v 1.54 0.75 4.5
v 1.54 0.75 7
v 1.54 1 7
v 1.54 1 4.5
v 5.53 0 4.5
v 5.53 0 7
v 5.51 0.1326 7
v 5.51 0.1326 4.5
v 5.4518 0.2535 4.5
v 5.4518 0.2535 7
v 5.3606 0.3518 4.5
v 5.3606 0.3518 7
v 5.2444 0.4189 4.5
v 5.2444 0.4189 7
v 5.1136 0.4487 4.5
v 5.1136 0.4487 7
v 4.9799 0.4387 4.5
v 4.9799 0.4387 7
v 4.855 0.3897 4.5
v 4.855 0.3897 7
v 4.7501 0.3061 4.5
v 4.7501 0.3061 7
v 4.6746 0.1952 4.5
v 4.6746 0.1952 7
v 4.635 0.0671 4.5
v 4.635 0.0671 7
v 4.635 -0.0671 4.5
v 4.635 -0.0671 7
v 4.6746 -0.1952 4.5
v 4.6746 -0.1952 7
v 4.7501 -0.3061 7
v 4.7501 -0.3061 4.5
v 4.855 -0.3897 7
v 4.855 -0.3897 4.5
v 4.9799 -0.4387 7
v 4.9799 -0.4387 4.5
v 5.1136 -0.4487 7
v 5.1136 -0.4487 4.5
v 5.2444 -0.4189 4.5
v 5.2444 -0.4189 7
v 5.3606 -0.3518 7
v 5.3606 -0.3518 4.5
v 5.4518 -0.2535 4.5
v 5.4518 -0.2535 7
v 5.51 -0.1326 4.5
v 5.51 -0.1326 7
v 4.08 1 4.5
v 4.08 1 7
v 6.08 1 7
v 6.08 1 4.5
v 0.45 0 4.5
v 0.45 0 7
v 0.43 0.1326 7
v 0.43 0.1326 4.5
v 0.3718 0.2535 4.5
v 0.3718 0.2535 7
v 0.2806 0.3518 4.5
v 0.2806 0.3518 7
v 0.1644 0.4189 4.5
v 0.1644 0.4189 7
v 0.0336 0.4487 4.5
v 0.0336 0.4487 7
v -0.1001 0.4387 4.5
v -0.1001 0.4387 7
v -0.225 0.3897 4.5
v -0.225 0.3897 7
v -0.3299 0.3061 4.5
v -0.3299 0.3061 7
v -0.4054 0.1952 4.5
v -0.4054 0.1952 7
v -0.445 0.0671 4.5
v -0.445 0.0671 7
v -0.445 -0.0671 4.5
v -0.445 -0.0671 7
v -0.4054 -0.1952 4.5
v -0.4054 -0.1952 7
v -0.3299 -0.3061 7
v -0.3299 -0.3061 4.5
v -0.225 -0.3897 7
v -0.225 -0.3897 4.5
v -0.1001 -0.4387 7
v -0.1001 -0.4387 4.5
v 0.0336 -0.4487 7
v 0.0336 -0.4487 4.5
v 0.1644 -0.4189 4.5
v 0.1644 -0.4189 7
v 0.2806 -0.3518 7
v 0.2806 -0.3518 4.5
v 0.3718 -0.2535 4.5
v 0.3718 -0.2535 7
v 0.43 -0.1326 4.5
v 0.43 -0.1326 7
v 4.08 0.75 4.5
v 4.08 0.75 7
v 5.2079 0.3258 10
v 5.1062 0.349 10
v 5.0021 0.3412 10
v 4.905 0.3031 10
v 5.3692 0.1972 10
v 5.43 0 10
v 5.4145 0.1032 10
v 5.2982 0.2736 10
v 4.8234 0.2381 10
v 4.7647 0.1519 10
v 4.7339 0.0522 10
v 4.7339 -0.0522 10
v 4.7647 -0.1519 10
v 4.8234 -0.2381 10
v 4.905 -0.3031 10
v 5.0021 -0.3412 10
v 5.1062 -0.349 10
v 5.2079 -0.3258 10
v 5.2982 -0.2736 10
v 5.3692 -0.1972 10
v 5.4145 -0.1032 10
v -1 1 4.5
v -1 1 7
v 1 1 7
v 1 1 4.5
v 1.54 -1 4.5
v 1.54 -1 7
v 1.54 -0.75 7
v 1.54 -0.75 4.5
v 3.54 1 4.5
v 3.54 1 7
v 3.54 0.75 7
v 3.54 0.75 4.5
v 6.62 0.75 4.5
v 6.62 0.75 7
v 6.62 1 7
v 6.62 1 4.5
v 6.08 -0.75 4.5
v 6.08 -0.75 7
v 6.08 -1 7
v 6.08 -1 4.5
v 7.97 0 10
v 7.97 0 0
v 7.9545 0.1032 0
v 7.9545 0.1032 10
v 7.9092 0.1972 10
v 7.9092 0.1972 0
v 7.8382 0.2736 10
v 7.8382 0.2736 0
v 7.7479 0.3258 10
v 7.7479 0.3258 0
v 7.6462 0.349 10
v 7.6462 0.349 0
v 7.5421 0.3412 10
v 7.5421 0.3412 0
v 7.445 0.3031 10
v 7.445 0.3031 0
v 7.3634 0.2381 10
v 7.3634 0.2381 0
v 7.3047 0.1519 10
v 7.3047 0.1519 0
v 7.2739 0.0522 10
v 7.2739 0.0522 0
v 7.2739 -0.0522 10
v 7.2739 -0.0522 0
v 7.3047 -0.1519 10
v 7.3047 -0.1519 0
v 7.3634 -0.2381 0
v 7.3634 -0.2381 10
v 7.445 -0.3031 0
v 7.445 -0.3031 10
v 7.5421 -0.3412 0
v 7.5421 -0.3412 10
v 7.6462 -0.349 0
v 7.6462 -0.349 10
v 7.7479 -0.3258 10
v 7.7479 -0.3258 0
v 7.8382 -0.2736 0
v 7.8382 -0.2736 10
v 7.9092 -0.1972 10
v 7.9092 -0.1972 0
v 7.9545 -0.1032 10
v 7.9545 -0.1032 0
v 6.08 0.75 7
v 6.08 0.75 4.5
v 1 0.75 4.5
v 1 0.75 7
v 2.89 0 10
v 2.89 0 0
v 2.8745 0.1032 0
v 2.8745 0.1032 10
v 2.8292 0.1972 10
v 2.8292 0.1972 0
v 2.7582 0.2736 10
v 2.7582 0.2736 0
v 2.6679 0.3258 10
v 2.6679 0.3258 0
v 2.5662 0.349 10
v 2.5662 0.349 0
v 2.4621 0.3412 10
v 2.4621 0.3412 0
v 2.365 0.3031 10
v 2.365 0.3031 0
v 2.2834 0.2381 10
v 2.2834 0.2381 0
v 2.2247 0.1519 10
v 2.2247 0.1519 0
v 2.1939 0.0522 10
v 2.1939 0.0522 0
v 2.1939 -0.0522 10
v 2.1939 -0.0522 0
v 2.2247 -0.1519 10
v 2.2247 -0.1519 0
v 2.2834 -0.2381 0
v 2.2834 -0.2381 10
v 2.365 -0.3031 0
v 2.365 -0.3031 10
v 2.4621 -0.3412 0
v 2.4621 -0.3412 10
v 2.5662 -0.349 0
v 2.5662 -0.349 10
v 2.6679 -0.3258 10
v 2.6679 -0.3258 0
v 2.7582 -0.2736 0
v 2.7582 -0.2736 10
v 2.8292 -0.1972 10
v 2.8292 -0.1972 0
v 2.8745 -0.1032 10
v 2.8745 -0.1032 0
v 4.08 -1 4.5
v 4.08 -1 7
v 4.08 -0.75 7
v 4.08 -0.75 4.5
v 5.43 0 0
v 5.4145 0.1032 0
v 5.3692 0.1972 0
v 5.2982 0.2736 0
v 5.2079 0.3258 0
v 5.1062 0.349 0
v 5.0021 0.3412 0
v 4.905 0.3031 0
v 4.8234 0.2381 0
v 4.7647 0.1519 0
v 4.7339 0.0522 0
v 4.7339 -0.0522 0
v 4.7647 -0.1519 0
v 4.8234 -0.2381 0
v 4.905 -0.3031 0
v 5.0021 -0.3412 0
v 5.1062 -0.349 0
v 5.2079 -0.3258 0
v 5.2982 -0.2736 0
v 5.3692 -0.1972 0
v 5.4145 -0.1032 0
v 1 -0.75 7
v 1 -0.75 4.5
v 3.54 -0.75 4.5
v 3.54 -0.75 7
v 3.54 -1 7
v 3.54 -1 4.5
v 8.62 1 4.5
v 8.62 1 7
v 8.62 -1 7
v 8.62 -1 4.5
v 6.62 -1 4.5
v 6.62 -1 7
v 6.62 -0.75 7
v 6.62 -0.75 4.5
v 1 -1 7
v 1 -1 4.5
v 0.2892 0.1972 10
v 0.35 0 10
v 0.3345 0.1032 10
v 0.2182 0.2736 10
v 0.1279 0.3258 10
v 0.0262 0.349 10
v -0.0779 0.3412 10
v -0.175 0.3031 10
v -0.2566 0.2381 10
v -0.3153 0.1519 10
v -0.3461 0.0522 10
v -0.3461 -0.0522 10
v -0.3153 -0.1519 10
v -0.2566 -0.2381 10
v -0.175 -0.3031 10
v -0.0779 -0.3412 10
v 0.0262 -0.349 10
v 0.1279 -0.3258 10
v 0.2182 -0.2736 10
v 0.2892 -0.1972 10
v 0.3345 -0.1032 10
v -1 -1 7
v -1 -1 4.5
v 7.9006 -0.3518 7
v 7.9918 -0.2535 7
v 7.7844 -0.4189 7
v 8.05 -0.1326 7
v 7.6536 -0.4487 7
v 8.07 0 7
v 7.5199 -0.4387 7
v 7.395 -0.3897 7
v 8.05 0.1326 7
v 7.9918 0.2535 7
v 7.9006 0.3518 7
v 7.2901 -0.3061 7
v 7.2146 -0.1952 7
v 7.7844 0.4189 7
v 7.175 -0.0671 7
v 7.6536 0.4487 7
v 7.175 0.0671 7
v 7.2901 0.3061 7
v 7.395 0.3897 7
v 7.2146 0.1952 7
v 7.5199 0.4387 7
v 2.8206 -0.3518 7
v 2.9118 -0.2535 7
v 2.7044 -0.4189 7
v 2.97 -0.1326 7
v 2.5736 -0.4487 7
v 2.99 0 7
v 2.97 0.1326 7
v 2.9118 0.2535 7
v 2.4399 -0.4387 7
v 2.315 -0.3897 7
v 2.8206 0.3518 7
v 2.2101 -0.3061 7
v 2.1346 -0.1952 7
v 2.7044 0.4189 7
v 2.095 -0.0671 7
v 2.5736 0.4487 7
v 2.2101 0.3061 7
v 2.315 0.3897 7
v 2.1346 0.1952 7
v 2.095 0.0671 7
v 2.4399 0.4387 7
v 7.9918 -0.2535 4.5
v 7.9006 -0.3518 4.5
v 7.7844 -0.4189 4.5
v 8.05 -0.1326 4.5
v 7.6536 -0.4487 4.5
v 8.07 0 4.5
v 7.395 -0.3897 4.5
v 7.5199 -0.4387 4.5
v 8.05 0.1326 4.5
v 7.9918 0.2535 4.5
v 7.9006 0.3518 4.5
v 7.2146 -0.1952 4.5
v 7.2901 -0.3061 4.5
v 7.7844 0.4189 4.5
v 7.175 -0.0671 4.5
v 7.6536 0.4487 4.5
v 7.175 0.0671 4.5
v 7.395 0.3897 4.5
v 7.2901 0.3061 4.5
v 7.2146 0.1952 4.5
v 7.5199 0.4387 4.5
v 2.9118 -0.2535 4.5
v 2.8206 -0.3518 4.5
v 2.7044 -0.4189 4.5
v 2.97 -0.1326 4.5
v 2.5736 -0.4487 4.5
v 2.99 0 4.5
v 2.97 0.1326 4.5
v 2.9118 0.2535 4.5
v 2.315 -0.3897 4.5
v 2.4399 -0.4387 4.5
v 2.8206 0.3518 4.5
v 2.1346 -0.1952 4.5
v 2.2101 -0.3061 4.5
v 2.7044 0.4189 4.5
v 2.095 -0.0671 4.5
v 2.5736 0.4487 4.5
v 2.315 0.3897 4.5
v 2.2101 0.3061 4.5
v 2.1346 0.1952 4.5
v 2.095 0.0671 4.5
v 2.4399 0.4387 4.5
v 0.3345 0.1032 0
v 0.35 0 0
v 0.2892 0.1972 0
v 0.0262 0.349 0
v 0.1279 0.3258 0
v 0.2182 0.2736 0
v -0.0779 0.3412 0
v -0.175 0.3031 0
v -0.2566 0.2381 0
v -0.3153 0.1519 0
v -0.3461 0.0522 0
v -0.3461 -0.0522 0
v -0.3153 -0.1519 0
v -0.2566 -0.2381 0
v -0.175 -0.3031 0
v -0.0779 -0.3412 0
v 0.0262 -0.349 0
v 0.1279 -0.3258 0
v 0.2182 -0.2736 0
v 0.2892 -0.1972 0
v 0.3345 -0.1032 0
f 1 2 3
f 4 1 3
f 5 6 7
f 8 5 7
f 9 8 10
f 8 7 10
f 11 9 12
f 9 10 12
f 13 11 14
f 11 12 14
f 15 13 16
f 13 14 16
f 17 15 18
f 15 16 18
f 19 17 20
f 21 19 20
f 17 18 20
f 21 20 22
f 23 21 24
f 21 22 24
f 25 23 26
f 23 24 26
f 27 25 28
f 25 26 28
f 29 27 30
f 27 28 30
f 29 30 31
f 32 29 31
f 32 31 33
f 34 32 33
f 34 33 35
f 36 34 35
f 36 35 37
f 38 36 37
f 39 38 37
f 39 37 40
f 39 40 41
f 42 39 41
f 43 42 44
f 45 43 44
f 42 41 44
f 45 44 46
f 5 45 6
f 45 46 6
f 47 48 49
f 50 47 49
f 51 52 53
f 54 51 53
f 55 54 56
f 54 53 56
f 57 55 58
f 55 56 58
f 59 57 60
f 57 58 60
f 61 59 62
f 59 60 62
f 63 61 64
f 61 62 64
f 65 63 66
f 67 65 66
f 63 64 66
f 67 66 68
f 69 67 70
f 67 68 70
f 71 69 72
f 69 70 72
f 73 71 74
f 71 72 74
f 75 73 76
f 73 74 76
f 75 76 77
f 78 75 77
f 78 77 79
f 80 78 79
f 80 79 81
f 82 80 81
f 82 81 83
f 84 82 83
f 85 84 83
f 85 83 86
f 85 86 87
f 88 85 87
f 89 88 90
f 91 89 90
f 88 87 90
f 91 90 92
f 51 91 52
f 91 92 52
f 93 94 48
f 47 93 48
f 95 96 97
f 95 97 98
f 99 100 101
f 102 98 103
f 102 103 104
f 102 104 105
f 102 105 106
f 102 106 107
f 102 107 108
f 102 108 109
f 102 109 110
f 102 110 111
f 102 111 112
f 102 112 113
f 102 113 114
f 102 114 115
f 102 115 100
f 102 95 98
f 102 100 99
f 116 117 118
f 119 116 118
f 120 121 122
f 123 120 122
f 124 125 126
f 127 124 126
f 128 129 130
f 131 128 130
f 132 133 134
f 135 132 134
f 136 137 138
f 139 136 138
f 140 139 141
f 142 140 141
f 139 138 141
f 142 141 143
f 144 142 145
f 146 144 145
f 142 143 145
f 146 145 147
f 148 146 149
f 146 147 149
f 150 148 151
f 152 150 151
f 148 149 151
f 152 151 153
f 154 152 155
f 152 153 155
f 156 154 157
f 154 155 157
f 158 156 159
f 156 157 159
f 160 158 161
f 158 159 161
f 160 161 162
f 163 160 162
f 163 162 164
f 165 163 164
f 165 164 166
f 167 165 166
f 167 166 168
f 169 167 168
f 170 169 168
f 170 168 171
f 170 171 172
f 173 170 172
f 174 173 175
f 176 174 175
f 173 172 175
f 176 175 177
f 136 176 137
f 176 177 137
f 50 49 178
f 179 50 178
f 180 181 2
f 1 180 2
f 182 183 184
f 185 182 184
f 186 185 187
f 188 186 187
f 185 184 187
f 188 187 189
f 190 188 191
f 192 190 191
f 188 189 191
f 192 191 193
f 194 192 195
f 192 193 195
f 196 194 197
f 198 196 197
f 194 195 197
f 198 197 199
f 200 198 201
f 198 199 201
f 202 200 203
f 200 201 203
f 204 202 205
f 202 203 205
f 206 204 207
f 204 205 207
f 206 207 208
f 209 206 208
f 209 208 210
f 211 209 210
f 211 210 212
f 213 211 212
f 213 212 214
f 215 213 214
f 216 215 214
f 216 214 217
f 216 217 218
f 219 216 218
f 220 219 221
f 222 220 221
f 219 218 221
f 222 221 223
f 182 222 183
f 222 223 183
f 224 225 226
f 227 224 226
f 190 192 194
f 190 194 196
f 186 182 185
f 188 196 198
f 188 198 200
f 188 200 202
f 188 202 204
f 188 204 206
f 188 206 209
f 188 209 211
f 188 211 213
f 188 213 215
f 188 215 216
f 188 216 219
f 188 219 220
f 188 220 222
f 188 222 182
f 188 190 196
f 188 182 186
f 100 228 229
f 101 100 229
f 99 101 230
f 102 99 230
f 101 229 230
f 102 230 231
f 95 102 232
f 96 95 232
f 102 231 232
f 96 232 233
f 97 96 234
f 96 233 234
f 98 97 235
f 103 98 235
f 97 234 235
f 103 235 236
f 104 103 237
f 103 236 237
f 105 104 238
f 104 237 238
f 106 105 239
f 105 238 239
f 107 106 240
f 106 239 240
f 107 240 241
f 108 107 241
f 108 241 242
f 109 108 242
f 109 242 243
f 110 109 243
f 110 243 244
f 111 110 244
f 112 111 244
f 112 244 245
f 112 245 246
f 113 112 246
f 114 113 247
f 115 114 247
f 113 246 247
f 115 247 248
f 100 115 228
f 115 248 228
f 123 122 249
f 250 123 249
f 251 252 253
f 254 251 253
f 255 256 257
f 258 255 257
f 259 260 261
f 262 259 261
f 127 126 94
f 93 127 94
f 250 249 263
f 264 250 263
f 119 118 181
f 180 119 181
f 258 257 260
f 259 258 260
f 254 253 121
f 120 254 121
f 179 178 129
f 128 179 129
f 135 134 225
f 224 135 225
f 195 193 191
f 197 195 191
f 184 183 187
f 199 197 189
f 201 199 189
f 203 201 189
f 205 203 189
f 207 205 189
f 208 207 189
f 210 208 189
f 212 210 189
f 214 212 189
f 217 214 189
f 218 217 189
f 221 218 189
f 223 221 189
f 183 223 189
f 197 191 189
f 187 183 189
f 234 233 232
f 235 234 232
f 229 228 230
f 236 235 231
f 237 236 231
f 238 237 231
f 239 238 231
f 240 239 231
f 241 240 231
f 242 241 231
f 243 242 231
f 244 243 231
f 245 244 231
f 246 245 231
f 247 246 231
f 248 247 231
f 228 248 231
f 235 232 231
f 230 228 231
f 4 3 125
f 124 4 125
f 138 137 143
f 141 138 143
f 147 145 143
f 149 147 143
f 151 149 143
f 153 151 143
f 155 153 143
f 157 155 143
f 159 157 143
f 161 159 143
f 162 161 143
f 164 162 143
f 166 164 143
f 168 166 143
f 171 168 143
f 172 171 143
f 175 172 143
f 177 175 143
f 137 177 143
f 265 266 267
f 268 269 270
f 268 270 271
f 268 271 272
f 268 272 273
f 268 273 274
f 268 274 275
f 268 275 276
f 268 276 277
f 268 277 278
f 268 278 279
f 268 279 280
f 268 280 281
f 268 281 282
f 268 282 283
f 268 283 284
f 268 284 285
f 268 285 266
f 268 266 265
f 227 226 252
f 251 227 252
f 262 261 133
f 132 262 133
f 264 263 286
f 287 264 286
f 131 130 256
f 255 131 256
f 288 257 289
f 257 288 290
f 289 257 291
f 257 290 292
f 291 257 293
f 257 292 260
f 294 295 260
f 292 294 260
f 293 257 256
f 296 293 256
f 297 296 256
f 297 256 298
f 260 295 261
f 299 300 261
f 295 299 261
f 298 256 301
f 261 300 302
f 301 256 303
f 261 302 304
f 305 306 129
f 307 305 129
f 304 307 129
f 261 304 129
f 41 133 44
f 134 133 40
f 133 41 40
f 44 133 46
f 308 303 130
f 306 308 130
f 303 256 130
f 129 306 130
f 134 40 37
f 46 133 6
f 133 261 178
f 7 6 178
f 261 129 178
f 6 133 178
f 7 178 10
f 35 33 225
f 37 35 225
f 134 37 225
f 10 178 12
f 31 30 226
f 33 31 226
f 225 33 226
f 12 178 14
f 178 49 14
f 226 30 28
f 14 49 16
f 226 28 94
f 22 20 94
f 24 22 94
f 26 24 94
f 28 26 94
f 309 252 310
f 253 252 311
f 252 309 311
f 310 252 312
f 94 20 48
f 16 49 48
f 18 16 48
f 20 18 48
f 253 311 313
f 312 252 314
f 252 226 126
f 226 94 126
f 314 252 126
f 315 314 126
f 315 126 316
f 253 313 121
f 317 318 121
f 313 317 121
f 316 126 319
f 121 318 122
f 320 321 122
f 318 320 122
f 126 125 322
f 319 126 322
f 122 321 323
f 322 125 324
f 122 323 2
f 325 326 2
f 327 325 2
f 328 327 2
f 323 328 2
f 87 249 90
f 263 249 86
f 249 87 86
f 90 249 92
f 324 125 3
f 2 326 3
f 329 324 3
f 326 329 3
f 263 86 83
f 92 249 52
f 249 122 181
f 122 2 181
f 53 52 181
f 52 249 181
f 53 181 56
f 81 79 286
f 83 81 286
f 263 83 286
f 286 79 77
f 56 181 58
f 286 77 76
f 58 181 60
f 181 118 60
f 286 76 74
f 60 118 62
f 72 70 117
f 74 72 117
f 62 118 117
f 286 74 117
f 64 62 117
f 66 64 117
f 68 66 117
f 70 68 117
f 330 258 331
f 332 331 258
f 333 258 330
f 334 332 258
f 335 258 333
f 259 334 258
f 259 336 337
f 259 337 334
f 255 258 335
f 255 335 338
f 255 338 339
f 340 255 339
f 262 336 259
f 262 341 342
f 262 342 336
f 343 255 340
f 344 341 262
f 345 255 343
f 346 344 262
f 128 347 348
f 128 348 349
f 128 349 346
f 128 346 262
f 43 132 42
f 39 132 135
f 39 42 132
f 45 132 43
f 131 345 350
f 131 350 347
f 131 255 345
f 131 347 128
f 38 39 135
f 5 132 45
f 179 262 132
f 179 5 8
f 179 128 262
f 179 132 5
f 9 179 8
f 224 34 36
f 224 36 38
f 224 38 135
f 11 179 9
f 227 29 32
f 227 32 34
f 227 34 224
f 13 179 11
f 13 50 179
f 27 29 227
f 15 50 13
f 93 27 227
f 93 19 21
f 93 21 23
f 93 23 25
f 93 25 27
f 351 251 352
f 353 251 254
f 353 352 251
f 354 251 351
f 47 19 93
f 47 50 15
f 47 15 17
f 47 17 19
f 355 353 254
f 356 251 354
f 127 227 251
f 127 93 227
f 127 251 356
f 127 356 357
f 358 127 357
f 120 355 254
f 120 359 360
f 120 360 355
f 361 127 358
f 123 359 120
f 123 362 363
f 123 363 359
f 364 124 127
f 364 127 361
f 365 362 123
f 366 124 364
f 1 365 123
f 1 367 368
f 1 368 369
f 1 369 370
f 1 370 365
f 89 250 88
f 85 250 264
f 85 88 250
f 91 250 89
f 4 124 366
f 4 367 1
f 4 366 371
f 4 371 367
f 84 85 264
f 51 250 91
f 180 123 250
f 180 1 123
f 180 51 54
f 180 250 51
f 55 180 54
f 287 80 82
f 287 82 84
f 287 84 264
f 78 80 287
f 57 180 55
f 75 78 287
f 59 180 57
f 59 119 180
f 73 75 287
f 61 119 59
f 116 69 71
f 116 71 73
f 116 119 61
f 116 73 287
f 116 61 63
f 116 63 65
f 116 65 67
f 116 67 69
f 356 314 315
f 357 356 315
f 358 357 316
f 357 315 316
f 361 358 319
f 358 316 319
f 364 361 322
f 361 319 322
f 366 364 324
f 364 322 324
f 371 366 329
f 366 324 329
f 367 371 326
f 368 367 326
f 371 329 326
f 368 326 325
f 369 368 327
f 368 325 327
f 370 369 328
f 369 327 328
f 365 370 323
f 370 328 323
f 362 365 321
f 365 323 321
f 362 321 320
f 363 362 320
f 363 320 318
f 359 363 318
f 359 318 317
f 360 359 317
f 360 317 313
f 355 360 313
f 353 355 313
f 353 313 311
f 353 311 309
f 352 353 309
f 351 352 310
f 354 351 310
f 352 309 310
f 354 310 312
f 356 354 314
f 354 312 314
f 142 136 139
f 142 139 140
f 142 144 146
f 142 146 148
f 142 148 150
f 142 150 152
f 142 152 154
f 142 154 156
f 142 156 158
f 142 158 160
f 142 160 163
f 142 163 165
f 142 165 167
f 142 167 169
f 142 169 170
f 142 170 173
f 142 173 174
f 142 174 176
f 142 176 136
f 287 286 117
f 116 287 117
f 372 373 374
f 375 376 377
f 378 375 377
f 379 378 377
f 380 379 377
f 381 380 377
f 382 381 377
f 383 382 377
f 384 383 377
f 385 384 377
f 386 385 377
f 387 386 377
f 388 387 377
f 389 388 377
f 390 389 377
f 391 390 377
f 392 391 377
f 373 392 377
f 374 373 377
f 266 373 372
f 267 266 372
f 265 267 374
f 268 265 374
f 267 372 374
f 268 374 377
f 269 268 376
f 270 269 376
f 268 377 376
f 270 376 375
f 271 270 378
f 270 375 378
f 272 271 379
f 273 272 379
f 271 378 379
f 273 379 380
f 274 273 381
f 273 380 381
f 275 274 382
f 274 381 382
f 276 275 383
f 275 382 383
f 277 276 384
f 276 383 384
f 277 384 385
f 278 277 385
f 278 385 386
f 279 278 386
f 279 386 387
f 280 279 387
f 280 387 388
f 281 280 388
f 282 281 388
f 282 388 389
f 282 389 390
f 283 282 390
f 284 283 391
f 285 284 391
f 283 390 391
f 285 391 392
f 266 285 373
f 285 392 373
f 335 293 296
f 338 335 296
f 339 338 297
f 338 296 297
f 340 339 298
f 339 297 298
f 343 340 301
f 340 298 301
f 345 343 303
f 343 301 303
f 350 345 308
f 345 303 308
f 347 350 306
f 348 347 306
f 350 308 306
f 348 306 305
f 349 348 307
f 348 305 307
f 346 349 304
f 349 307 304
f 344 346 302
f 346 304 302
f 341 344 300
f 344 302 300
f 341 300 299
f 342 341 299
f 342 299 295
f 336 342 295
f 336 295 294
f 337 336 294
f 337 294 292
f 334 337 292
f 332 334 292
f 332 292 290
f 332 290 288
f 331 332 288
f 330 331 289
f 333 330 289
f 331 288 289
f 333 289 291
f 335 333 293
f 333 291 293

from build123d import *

# Parameters (mm, degrees)
IZIM1_R                       = 0.35
Y_KSEKLIK_EKSTR_ZYON1_DEPTH   = 10
Y_KSEKLIK_EKSTR_ZYON1_2_DEPTH = 10
Y_KSEKLIK_EKSTR_ZYON1_3_DEPTH = 10
Y_KSEKLIK_EKSTR_ZYON1_4_DEPTH = 10
IZIM3_R                       = 0.45
Y_KSEKLIK_EKSTR_ZYON2_DEPTH   = 2.5


with BuildPart() as part:
    # Çizim1 → Yükseklik-Ekstrüzyon1 (new body)
    with BuildSketch(Plane.XY):
        Circle(IZIM1_R)
    extrude(amount=Y_KSEKLIK_EKSTR_ZYON1_DEPTH)


with BuildPart() as body_2:
    # Çizim1 → Y_kseklik-Ekstr_zyon1 2 (new body)
    with BuildSketch(Plane.XY):
        with Locations((2.54, 0)):
            Circle(IZIM1_R)
    extrude(amount=Y_KSEKLIK_EKSTR_ZYON1_2_DEPTH)


with BuildPart() as body_3:
    # Çizim1 → Y_kseklik-Ekstr_zyon1 3 (new body)
    with BuildSketch(Plane.XY):
        with Locations((5.08, 0)):
            Circle(IZIM1_R)
    extrude(amount=Y_KSEKLIK_EKSTR_ZYON1_3_DEPTH)


with BuildPart() as body_4:
    # Çizim1 → Y_kseklik-Ekstr_zyon1 4 (new body)
    with BuildSketch(Plane.XY):
        with Locations((7.62, 0)):
            Circle(IZIM1_R)
    extrude(amount=Y_KSEKLIK_EKSTR_ZYON1_4_DEPTH)


with BuildPart() as body_5:
    # Çizim3 → Yükseklik-Ekstrüzyon2 (new body)
    with BuildSketch(Plane.XY.offset(7)):
        Polygon((1.54, 1), (3.54, 1), (3.54, 0.75), (4.08, 0.75), (4.08, 1), (6.08, 1), (6.08, 0.75), (6.62, 0.75), (6.62, 1), (8.62, 1), (8.62, -1), (6.62, -1), (6.62, -0.75), (6.08, -0.75), (6.08, -1), (4.08, -1), (4.08, -0.75), (3.54, -0.75), (3.54, -1), (1.54, -1), (1.54, -0.75), (1, -0.75), (1, -1), (-1, -1), (-1, 1), (1, 1), (1, 0.75), (1.54, 0.75), align=None)
        Circle(IZIM3_R, mode=Mode.SUBTRACT)
        with Locations((2.54, 0)):
            Circle(IZIM3_R, mode=Mode.SUBTRACT)
        with Locations((5.08, 0)):
            Circle(IZIM3_R, mode=Mode.SUBTRACT)
        with Locations((7.62, 0)):
            Circle(IZIM3_R, mode=Mode.SUBTRACT)
    extrude(amount=-Y_KSEKLIK_EKSTR_ZYON2_DEPTH)


solid = Compound([part.part, body_2.part, body_3.part, body_4.part, body_5.part])
